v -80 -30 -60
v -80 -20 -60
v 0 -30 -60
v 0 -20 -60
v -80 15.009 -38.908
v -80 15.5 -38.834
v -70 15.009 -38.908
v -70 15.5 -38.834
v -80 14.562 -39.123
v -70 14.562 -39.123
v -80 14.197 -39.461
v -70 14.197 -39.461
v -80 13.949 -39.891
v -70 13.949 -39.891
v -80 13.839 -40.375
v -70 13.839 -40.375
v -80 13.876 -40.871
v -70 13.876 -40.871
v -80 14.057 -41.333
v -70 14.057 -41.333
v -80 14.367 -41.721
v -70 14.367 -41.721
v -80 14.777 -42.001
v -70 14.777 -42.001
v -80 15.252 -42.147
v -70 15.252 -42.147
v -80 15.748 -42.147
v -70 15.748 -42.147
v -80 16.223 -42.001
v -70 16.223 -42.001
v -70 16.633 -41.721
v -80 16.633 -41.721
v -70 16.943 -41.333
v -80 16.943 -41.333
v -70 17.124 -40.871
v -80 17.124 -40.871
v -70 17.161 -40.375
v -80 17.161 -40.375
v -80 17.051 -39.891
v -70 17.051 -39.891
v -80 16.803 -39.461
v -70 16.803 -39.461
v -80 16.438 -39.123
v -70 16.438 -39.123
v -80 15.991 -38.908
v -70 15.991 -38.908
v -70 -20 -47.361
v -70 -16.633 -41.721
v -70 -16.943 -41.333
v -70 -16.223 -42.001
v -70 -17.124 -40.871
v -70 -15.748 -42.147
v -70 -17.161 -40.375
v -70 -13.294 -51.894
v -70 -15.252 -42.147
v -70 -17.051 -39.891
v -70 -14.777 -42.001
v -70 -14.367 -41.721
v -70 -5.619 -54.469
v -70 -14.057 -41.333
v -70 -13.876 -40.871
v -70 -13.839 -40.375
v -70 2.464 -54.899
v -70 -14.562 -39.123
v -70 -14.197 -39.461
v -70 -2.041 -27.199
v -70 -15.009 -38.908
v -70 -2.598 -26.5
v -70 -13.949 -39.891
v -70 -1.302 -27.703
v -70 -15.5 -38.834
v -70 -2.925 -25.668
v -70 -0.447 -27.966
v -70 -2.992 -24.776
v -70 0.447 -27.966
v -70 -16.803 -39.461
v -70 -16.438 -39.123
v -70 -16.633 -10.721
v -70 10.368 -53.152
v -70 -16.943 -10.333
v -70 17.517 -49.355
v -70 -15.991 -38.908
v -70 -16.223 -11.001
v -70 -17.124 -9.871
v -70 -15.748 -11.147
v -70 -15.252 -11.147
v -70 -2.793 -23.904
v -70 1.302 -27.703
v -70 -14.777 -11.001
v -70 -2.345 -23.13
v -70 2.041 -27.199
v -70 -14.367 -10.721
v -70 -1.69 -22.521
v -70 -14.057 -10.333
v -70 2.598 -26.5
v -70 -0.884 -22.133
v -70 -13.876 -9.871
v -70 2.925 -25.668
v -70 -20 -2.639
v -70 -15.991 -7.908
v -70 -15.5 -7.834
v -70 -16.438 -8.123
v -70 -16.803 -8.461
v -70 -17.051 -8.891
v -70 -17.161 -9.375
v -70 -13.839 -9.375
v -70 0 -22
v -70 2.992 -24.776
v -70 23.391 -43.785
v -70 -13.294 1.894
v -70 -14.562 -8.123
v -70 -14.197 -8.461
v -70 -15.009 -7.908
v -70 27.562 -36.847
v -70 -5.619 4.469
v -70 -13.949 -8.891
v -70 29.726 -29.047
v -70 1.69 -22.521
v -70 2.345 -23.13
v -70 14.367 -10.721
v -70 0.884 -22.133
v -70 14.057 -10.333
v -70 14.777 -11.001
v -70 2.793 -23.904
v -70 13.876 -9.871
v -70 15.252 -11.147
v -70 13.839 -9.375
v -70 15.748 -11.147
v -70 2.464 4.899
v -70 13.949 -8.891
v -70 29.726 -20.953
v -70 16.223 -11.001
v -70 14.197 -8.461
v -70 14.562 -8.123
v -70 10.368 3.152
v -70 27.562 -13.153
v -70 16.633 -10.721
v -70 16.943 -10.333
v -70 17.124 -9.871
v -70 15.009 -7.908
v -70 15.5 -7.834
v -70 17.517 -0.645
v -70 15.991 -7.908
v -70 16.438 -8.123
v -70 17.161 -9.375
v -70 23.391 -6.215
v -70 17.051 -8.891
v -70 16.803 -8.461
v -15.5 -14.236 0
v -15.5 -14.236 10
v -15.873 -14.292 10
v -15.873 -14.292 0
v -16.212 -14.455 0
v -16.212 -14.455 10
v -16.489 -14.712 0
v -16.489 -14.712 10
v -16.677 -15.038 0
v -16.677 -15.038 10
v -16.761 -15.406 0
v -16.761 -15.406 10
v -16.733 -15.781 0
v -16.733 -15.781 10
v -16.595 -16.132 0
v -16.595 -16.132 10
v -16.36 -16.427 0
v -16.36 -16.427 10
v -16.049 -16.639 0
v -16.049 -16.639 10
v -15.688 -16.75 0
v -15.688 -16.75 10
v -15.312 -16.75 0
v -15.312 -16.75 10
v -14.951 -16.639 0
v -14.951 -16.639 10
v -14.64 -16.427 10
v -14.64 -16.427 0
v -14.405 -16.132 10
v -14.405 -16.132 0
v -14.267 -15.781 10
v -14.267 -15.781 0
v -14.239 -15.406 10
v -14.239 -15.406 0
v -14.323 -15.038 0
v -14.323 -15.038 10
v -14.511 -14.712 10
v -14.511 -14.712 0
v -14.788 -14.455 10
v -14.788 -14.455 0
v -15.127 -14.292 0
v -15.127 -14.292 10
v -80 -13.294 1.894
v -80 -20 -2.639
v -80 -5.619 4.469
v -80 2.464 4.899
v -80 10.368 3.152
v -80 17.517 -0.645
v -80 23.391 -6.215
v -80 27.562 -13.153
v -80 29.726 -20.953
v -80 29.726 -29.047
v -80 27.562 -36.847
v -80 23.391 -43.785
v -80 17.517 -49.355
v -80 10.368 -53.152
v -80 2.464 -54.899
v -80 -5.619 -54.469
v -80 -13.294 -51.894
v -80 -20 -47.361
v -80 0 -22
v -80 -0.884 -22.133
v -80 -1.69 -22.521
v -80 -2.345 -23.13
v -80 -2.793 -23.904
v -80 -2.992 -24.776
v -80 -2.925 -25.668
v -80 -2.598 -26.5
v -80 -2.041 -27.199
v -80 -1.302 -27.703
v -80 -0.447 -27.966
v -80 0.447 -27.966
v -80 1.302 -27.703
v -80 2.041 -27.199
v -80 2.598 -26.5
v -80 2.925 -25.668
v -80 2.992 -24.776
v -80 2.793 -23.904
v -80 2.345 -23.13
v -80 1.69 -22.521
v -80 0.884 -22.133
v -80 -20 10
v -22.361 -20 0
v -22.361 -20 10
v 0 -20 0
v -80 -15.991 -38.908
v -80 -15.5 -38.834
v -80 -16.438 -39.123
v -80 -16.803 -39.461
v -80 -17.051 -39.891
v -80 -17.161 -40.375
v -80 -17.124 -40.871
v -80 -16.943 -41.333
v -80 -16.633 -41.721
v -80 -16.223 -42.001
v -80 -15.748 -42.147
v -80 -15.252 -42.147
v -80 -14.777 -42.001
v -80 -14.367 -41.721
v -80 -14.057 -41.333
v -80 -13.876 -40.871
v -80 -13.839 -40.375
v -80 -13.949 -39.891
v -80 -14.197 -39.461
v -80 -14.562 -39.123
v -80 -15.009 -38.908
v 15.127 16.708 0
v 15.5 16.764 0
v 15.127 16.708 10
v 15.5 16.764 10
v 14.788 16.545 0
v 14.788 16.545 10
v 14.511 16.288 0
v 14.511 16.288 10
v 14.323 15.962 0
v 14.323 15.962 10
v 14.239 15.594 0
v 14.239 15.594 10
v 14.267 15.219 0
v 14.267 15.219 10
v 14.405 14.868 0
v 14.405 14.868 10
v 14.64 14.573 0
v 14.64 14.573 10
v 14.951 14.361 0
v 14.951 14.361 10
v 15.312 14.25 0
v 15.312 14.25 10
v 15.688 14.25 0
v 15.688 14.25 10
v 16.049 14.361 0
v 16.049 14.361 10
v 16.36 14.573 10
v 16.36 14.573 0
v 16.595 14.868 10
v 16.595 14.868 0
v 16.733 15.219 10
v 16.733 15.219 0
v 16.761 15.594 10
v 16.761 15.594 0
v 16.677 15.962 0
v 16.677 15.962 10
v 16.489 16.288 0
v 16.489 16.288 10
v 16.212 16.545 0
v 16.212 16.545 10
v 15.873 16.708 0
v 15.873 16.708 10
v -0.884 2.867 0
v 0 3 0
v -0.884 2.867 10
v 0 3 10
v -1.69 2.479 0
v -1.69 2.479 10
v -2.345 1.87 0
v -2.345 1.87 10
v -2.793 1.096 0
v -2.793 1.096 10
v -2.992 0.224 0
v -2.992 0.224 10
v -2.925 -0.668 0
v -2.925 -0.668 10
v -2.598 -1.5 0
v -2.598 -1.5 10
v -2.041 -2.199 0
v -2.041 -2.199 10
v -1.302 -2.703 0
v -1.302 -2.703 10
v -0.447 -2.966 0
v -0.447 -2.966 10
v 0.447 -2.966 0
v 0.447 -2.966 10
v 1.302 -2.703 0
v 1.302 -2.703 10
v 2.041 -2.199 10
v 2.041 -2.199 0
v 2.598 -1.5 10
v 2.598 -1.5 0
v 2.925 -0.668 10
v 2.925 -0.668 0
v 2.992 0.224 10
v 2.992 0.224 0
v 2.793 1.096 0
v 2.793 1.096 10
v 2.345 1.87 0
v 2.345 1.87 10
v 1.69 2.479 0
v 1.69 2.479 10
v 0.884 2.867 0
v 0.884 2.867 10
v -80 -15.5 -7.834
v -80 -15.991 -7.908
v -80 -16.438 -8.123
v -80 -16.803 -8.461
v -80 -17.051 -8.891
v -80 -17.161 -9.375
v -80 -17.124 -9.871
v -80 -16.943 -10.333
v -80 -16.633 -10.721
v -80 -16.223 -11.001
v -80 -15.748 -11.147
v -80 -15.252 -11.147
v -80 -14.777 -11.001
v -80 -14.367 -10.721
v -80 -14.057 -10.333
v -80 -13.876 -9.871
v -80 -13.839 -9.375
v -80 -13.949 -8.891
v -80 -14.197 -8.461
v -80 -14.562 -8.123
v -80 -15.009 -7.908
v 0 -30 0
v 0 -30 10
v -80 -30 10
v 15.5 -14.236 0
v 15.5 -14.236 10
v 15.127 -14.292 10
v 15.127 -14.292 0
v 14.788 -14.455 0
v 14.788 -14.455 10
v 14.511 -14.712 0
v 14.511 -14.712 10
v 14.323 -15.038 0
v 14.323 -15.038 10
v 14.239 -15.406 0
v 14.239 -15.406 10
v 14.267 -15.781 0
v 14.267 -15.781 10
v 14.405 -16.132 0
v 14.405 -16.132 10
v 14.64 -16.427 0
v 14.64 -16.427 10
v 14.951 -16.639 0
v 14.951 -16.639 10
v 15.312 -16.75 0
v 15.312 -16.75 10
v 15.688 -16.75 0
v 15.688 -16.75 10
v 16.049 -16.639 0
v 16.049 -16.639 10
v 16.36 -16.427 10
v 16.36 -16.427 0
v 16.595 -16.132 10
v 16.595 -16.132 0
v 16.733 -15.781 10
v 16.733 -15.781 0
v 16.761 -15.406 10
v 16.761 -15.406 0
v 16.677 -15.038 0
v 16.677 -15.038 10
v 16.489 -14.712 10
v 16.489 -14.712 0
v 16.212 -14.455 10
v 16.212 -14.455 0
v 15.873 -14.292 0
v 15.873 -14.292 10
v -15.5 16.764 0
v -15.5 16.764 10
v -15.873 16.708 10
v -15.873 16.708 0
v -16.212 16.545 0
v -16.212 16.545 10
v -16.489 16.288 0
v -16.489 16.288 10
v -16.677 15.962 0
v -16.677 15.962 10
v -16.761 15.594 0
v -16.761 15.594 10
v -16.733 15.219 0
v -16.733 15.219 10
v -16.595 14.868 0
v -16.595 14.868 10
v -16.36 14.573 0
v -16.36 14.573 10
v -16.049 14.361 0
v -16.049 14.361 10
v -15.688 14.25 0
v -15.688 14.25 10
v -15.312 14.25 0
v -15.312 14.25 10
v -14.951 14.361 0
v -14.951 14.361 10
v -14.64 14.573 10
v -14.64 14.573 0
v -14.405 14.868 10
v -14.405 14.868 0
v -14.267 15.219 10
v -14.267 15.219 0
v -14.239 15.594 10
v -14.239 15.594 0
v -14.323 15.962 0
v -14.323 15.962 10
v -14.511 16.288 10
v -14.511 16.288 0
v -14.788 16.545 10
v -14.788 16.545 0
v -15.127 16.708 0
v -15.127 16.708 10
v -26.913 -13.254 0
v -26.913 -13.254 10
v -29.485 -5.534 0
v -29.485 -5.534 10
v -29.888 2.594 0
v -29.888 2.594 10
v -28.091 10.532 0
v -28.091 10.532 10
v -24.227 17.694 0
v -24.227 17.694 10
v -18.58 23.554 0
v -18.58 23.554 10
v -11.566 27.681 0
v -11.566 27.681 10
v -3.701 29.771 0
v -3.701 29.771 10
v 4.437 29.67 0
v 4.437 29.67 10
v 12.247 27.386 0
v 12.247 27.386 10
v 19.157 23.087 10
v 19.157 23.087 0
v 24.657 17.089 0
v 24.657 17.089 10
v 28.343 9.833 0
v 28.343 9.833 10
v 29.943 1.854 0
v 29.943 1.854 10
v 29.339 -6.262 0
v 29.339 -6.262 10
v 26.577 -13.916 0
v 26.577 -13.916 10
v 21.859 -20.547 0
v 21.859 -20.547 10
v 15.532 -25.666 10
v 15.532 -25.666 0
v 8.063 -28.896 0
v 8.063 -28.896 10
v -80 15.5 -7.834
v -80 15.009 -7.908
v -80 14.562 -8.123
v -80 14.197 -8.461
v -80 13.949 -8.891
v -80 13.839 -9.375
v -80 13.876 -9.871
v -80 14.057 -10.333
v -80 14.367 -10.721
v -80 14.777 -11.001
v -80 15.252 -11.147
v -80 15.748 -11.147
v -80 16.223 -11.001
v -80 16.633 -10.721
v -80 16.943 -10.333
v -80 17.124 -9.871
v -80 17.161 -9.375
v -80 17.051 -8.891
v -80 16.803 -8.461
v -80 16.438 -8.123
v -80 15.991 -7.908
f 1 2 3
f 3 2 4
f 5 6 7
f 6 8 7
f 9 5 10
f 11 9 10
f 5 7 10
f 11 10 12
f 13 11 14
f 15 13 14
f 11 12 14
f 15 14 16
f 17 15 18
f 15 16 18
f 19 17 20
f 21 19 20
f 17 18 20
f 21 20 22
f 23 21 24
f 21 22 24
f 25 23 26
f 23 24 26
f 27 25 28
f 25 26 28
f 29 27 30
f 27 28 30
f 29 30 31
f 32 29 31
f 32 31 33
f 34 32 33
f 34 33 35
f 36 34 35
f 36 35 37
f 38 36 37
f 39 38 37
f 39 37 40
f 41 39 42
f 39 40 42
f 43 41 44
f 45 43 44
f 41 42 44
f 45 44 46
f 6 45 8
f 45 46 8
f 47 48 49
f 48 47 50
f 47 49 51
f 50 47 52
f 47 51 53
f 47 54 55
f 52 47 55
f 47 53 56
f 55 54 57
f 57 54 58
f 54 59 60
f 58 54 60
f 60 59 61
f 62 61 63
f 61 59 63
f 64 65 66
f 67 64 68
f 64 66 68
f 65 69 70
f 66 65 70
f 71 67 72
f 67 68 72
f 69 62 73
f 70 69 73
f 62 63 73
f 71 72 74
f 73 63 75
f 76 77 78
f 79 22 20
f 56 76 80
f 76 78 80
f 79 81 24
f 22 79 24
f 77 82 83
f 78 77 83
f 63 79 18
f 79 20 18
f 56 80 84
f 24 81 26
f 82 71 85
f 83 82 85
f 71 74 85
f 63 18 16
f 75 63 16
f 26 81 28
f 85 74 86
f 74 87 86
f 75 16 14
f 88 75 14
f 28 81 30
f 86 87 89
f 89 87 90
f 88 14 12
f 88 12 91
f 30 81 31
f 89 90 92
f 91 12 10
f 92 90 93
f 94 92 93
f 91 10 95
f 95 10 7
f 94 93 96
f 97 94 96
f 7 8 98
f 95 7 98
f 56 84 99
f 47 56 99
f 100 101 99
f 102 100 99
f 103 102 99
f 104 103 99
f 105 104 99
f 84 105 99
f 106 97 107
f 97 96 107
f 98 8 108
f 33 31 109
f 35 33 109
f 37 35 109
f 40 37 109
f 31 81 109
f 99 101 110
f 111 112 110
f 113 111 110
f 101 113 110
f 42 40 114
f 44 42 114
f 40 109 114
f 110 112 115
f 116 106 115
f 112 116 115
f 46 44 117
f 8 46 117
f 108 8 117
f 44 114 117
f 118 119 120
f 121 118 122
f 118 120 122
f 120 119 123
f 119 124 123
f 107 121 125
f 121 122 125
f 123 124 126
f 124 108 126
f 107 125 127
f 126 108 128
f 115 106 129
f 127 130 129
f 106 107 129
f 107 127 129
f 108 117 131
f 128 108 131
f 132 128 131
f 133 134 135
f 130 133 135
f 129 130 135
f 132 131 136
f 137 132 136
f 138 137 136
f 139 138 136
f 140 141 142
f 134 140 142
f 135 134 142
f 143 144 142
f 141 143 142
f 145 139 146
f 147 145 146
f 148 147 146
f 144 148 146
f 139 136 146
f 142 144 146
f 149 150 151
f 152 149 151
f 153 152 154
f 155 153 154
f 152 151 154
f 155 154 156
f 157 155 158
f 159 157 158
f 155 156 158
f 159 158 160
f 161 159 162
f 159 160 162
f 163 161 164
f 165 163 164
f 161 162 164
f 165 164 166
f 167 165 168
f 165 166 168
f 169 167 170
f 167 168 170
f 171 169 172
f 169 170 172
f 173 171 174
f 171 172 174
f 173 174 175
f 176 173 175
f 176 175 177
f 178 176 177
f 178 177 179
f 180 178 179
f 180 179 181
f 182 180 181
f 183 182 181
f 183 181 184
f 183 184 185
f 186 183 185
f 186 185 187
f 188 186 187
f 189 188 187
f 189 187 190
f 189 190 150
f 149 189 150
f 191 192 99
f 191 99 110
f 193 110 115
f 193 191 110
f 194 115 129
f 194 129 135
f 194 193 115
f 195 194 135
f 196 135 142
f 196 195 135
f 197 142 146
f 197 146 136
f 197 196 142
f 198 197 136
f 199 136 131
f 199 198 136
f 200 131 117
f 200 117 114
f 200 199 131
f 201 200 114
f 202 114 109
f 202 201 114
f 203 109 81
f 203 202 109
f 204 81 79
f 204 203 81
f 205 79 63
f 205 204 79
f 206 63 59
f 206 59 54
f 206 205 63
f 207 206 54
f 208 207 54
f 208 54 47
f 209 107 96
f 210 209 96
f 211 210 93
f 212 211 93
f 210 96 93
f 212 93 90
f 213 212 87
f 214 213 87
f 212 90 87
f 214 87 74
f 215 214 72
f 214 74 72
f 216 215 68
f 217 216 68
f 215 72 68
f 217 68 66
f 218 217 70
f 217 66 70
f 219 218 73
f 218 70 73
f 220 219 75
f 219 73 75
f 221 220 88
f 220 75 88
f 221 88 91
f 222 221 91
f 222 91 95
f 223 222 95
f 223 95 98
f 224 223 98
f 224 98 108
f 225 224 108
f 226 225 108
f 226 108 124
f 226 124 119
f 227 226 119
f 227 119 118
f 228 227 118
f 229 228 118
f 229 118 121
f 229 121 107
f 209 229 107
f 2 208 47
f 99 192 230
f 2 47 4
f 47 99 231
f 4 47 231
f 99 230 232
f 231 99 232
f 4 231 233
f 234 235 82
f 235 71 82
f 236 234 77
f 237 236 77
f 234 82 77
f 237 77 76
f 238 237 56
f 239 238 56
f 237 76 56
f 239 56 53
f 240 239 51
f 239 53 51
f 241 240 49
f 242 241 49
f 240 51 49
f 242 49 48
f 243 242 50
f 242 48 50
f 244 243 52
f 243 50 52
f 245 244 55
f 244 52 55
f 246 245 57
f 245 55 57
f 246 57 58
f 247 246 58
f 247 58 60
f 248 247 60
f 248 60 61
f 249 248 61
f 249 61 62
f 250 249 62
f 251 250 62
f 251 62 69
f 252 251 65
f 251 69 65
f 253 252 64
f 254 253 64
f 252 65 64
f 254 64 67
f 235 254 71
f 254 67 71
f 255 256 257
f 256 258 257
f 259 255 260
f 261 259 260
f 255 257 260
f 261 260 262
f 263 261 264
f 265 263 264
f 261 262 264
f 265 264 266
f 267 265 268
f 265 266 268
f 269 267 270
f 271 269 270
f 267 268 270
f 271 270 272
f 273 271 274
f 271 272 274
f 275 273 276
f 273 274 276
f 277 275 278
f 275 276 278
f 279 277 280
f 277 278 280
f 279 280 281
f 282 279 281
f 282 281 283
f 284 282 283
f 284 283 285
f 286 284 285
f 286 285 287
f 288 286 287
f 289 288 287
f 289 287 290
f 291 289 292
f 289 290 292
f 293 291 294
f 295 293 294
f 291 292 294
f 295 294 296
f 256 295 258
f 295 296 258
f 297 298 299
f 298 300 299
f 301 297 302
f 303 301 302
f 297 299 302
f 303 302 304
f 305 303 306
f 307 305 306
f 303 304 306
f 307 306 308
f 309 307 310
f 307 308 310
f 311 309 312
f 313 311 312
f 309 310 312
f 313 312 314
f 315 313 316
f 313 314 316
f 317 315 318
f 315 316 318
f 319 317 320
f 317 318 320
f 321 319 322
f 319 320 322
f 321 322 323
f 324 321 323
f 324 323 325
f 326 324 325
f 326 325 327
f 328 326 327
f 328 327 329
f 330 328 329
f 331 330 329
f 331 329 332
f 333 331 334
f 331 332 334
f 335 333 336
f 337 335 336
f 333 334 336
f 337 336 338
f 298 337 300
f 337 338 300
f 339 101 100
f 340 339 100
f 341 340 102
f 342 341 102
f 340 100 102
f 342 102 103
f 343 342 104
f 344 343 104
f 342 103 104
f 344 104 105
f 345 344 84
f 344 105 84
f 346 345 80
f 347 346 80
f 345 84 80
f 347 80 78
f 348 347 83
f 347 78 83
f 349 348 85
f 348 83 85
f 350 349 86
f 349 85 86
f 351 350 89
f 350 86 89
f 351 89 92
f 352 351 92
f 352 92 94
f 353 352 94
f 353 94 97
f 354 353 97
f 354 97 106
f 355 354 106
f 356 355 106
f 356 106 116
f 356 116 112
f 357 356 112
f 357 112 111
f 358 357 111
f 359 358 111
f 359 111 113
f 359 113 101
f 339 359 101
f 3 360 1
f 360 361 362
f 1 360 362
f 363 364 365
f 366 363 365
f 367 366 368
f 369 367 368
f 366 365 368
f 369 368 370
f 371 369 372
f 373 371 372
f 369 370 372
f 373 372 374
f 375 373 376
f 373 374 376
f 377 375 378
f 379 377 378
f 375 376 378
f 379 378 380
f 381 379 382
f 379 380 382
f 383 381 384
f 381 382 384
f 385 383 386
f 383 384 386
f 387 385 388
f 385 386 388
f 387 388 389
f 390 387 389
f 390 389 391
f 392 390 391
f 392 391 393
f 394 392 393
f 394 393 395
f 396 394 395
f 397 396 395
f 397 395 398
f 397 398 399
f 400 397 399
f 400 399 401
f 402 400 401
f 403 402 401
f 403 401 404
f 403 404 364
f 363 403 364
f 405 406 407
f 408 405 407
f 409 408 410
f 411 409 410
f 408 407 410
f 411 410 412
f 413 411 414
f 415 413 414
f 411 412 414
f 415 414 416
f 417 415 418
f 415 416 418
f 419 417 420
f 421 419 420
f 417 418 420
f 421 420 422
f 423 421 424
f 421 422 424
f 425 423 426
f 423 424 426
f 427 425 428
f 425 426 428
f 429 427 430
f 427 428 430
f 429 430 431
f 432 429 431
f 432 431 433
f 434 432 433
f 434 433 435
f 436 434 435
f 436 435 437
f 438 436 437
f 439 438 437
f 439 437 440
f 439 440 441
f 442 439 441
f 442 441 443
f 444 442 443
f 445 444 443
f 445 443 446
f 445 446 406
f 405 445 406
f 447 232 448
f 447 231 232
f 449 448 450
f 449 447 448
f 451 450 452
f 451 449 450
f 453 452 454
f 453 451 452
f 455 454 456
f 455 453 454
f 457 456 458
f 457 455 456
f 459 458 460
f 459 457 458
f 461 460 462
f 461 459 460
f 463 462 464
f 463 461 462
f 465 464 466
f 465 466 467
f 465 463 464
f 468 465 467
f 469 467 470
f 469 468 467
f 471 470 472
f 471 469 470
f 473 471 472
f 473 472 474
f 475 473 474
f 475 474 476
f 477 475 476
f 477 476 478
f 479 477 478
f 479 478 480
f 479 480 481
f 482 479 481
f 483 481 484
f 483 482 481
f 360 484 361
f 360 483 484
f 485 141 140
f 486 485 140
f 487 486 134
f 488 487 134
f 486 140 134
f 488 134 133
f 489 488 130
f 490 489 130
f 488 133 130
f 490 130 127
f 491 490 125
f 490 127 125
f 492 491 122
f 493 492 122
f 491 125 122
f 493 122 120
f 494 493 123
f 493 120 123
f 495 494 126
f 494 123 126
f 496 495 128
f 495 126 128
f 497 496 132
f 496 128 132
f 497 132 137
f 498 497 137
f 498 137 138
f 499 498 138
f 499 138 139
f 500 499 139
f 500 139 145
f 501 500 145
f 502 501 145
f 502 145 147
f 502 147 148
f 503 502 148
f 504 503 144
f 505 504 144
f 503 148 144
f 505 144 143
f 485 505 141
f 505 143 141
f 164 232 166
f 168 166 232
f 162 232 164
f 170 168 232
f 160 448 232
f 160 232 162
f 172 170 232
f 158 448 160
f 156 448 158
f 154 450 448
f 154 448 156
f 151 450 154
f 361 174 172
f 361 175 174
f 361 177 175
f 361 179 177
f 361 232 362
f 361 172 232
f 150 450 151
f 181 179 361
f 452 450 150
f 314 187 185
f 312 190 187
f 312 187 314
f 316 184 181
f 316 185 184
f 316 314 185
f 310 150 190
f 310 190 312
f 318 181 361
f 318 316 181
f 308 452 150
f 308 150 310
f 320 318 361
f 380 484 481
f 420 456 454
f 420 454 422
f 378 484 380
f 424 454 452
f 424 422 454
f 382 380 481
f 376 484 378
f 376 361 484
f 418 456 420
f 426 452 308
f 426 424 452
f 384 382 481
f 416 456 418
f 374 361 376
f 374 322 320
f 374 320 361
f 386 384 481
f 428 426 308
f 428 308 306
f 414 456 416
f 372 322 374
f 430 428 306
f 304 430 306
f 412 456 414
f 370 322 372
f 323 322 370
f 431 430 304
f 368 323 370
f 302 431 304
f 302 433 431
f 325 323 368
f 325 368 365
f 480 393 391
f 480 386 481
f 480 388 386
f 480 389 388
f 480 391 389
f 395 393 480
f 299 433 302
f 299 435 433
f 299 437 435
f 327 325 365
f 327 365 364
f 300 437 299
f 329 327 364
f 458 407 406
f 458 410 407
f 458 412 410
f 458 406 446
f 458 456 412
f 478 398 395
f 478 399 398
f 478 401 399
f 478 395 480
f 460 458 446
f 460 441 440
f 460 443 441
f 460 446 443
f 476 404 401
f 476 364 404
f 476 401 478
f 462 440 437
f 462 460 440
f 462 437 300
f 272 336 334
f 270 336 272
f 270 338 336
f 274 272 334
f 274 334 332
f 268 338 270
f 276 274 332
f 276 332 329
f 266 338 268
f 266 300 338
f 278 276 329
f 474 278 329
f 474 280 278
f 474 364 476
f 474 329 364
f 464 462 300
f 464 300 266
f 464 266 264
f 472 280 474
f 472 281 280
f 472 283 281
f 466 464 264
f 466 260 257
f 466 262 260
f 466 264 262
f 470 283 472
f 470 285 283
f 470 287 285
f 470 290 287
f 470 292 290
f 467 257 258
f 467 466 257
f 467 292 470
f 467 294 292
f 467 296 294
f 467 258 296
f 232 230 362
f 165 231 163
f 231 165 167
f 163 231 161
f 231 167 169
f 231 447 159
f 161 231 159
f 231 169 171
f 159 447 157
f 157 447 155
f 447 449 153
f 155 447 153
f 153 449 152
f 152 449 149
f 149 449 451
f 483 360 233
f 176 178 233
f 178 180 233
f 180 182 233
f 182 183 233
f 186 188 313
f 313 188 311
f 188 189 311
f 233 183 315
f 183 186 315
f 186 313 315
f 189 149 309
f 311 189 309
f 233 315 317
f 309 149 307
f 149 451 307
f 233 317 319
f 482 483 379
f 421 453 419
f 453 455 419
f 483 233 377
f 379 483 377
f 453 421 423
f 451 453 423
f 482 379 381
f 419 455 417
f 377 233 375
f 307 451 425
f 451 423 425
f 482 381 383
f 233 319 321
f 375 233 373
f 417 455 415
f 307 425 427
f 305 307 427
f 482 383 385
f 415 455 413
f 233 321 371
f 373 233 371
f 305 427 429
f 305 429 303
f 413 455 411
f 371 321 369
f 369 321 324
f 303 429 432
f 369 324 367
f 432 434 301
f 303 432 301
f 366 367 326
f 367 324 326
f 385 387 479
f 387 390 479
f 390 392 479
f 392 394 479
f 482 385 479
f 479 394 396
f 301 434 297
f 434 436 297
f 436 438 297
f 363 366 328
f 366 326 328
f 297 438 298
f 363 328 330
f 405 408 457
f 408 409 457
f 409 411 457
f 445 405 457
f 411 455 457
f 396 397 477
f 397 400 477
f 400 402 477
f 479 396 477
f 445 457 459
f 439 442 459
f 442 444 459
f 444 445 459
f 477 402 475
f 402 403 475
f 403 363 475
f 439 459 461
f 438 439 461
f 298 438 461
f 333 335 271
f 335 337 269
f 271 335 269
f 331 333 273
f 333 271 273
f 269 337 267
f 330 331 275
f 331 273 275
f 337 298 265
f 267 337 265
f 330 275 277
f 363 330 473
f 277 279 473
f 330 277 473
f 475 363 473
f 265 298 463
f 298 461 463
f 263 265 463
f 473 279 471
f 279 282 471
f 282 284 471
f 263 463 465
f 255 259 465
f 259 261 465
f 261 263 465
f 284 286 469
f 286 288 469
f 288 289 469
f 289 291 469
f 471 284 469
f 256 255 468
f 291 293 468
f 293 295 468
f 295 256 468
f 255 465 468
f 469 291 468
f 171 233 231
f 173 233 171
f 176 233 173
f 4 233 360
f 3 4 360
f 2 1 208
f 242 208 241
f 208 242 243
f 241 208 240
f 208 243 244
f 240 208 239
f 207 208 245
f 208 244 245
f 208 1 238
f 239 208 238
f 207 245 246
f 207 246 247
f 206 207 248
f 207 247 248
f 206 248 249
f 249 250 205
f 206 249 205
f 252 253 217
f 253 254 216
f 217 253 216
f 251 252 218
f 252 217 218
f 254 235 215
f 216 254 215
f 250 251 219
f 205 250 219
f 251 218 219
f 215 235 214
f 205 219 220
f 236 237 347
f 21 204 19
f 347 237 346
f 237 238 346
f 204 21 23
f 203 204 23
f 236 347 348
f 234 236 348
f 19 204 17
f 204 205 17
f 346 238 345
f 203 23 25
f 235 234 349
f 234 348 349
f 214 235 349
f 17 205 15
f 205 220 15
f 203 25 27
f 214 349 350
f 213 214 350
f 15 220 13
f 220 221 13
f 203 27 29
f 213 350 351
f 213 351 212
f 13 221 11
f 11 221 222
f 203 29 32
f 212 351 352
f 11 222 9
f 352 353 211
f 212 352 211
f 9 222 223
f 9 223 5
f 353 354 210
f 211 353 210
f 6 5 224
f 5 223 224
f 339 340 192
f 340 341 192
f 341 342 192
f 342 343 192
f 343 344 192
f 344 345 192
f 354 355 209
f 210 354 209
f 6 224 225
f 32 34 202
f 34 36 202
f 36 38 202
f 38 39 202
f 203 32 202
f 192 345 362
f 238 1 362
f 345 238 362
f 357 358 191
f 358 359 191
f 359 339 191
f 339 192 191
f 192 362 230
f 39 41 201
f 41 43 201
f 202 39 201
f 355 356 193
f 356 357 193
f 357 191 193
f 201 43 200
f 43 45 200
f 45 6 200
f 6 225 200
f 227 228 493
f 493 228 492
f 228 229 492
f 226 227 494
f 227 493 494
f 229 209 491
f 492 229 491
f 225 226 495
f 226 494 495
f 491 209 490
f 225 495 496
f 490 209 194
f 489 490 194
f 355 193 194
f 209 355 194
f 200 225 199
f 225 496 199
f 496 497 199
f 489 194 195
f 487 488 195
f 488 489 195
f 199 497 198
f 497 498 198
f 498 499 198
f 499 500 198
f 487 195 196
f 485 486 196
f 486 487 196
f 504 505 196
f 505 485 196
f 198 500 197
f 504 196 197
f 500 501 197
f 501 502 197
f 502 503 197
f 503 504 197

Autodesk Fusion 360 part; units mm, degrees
sketch "Sketch1" plane through (0, 0, 0) normal (0, 0, 1) x (1, 0, 0)
  circle A0 centre (0, 0) radius 30
  dimension "d1" = 60
extrude "Extrude1" add sketch "Sketch1" along normal blind 10
sketch "Sketch2" plane through (0, 0, 10) normal (0, 0, 1) x (1, 0, 0)
  circle A0 centre (0, 0) radius 30
  line L0 (0, -30) -> (-80, -30)
  line L1 (-80, -30) -> (-80, -20)
  line L2 (-80, -20) -> (0, -20)
  line L3 (0, -20) -> (0, -30)
  dimension "d4" = 80
  dimension "d5" = 10
extrude "Extrude2" add sketch "Sketch2" against normal blind 70 contours A0 L0 L1 L2 | A0 L2 L3 picked at (-1.3972, -26.5686)
sketch "Sketch3" plane through (-80, 0, 0) normal (-1, 0, 0) x (0, 0, 1)
  line L0 (10, -30) -> (10, -20)
  line L1 (10, -20) -> (-60, -20)
  line L2 (-60, -20) -> (-60, -30)
  line L3 (-60, -30) -> (10, -30)
  circle A0 centre (-25, 0) radius 30
  line L4 (-25, -30) -> (-25, 0) construction
  dimension "d8" = 60
extrude "Extrude3" add sketch "Sketch3" against normal blind 10 contours L1 A0 picked at (-32.7403, 15.1228)
sketch "Sketch4" plane through (0, 0, 0) normal (0, 0, -1) x (-1, 0, 0)
  line L0 (0, -30) -> (0, -20)
  line L1 (0, -20) -> (22.3607, -20)
  arc A0 (22.3607, -20) -> (0, -30) centre (0, 0) ccw
  line L2 (15.5, -15.5) -> (-15.5, -15.5)
  line L3 (-15.5, -15.5) -> (-15.5, 15.5)
  line L4 (-15.5, 15.5) -> (15.5, 15.5)
  line L5 (15.5, 15.5) -> (15.5, -15.5)
  line L6 (15.5, -15.5) -> (-15.5, 15.5) construction
  line L7 (-15.5, -15.5) -> (15.5, 15.5) construction
  dimension "d11" = 31
  dimension "d12" = 31
hole "Hole1" at (-15.5, 15.5, 0) at (15.5, 15.5, 0) at (15.5, -15.5, 0) at (-15.5, -15.5, 0) direction (0, 0, 1) diameter 2.529 depth 10 tip angle 118
hole "Hole2" at (0, 0, 0) direction (0, 0, 1) diameter 6 depth 10 tip angle 118
sketch "Sketch5" plane through (-80, 0, 0) normal (-1, 0, 0) x (0, 0, 1)
  line L0 (10, -30) -> (10, -20)
  line L1 (10, -20) -> (-2.6393, -20)
  arc A0 (-2.6393, -20) -> (-47.3607, -20) centre (-25, 0) ccw
  line L2 (-47.3607, -20) -> (-60, -20)
  line L3 (-60, -20) -> (-60, -30)
  line L4 (-60, -30) -> (10, -30)
  line L5 (-40.5, 15.5) -> (-9.5, 15.5)
  line L6 (-9.5, 15.5) -> (-9.5, -15.5)
  line L7 (-9.5, -15.5) -> (-40.5, -15.5)
  line L8 (-40.5, -15.5) -> (-40.5, 15.5)
  line L9 (-40.5, 15.5) -> (-9.5, -15.5) construction
  line L10 (-9.5, 15.5) -> (-40.5, -15.5) construction
  point P0 (-25, 0)
  dimension "d19" = 31
  dimension "d20" = 31
hole "Hole3" at (-80, 15.5, -40.5) at (-80, 15.5, -9.5) at (-80, -15.5, -40.5) at (-80, -15.5, -9.5) direction (1, 0, 0) diameter 3.332 depth 40 tip angle 118
hole "Hole4" at (-80, 0, -25) direction (1, 0, 0) diameter 6 depth 40 tip angle 118
